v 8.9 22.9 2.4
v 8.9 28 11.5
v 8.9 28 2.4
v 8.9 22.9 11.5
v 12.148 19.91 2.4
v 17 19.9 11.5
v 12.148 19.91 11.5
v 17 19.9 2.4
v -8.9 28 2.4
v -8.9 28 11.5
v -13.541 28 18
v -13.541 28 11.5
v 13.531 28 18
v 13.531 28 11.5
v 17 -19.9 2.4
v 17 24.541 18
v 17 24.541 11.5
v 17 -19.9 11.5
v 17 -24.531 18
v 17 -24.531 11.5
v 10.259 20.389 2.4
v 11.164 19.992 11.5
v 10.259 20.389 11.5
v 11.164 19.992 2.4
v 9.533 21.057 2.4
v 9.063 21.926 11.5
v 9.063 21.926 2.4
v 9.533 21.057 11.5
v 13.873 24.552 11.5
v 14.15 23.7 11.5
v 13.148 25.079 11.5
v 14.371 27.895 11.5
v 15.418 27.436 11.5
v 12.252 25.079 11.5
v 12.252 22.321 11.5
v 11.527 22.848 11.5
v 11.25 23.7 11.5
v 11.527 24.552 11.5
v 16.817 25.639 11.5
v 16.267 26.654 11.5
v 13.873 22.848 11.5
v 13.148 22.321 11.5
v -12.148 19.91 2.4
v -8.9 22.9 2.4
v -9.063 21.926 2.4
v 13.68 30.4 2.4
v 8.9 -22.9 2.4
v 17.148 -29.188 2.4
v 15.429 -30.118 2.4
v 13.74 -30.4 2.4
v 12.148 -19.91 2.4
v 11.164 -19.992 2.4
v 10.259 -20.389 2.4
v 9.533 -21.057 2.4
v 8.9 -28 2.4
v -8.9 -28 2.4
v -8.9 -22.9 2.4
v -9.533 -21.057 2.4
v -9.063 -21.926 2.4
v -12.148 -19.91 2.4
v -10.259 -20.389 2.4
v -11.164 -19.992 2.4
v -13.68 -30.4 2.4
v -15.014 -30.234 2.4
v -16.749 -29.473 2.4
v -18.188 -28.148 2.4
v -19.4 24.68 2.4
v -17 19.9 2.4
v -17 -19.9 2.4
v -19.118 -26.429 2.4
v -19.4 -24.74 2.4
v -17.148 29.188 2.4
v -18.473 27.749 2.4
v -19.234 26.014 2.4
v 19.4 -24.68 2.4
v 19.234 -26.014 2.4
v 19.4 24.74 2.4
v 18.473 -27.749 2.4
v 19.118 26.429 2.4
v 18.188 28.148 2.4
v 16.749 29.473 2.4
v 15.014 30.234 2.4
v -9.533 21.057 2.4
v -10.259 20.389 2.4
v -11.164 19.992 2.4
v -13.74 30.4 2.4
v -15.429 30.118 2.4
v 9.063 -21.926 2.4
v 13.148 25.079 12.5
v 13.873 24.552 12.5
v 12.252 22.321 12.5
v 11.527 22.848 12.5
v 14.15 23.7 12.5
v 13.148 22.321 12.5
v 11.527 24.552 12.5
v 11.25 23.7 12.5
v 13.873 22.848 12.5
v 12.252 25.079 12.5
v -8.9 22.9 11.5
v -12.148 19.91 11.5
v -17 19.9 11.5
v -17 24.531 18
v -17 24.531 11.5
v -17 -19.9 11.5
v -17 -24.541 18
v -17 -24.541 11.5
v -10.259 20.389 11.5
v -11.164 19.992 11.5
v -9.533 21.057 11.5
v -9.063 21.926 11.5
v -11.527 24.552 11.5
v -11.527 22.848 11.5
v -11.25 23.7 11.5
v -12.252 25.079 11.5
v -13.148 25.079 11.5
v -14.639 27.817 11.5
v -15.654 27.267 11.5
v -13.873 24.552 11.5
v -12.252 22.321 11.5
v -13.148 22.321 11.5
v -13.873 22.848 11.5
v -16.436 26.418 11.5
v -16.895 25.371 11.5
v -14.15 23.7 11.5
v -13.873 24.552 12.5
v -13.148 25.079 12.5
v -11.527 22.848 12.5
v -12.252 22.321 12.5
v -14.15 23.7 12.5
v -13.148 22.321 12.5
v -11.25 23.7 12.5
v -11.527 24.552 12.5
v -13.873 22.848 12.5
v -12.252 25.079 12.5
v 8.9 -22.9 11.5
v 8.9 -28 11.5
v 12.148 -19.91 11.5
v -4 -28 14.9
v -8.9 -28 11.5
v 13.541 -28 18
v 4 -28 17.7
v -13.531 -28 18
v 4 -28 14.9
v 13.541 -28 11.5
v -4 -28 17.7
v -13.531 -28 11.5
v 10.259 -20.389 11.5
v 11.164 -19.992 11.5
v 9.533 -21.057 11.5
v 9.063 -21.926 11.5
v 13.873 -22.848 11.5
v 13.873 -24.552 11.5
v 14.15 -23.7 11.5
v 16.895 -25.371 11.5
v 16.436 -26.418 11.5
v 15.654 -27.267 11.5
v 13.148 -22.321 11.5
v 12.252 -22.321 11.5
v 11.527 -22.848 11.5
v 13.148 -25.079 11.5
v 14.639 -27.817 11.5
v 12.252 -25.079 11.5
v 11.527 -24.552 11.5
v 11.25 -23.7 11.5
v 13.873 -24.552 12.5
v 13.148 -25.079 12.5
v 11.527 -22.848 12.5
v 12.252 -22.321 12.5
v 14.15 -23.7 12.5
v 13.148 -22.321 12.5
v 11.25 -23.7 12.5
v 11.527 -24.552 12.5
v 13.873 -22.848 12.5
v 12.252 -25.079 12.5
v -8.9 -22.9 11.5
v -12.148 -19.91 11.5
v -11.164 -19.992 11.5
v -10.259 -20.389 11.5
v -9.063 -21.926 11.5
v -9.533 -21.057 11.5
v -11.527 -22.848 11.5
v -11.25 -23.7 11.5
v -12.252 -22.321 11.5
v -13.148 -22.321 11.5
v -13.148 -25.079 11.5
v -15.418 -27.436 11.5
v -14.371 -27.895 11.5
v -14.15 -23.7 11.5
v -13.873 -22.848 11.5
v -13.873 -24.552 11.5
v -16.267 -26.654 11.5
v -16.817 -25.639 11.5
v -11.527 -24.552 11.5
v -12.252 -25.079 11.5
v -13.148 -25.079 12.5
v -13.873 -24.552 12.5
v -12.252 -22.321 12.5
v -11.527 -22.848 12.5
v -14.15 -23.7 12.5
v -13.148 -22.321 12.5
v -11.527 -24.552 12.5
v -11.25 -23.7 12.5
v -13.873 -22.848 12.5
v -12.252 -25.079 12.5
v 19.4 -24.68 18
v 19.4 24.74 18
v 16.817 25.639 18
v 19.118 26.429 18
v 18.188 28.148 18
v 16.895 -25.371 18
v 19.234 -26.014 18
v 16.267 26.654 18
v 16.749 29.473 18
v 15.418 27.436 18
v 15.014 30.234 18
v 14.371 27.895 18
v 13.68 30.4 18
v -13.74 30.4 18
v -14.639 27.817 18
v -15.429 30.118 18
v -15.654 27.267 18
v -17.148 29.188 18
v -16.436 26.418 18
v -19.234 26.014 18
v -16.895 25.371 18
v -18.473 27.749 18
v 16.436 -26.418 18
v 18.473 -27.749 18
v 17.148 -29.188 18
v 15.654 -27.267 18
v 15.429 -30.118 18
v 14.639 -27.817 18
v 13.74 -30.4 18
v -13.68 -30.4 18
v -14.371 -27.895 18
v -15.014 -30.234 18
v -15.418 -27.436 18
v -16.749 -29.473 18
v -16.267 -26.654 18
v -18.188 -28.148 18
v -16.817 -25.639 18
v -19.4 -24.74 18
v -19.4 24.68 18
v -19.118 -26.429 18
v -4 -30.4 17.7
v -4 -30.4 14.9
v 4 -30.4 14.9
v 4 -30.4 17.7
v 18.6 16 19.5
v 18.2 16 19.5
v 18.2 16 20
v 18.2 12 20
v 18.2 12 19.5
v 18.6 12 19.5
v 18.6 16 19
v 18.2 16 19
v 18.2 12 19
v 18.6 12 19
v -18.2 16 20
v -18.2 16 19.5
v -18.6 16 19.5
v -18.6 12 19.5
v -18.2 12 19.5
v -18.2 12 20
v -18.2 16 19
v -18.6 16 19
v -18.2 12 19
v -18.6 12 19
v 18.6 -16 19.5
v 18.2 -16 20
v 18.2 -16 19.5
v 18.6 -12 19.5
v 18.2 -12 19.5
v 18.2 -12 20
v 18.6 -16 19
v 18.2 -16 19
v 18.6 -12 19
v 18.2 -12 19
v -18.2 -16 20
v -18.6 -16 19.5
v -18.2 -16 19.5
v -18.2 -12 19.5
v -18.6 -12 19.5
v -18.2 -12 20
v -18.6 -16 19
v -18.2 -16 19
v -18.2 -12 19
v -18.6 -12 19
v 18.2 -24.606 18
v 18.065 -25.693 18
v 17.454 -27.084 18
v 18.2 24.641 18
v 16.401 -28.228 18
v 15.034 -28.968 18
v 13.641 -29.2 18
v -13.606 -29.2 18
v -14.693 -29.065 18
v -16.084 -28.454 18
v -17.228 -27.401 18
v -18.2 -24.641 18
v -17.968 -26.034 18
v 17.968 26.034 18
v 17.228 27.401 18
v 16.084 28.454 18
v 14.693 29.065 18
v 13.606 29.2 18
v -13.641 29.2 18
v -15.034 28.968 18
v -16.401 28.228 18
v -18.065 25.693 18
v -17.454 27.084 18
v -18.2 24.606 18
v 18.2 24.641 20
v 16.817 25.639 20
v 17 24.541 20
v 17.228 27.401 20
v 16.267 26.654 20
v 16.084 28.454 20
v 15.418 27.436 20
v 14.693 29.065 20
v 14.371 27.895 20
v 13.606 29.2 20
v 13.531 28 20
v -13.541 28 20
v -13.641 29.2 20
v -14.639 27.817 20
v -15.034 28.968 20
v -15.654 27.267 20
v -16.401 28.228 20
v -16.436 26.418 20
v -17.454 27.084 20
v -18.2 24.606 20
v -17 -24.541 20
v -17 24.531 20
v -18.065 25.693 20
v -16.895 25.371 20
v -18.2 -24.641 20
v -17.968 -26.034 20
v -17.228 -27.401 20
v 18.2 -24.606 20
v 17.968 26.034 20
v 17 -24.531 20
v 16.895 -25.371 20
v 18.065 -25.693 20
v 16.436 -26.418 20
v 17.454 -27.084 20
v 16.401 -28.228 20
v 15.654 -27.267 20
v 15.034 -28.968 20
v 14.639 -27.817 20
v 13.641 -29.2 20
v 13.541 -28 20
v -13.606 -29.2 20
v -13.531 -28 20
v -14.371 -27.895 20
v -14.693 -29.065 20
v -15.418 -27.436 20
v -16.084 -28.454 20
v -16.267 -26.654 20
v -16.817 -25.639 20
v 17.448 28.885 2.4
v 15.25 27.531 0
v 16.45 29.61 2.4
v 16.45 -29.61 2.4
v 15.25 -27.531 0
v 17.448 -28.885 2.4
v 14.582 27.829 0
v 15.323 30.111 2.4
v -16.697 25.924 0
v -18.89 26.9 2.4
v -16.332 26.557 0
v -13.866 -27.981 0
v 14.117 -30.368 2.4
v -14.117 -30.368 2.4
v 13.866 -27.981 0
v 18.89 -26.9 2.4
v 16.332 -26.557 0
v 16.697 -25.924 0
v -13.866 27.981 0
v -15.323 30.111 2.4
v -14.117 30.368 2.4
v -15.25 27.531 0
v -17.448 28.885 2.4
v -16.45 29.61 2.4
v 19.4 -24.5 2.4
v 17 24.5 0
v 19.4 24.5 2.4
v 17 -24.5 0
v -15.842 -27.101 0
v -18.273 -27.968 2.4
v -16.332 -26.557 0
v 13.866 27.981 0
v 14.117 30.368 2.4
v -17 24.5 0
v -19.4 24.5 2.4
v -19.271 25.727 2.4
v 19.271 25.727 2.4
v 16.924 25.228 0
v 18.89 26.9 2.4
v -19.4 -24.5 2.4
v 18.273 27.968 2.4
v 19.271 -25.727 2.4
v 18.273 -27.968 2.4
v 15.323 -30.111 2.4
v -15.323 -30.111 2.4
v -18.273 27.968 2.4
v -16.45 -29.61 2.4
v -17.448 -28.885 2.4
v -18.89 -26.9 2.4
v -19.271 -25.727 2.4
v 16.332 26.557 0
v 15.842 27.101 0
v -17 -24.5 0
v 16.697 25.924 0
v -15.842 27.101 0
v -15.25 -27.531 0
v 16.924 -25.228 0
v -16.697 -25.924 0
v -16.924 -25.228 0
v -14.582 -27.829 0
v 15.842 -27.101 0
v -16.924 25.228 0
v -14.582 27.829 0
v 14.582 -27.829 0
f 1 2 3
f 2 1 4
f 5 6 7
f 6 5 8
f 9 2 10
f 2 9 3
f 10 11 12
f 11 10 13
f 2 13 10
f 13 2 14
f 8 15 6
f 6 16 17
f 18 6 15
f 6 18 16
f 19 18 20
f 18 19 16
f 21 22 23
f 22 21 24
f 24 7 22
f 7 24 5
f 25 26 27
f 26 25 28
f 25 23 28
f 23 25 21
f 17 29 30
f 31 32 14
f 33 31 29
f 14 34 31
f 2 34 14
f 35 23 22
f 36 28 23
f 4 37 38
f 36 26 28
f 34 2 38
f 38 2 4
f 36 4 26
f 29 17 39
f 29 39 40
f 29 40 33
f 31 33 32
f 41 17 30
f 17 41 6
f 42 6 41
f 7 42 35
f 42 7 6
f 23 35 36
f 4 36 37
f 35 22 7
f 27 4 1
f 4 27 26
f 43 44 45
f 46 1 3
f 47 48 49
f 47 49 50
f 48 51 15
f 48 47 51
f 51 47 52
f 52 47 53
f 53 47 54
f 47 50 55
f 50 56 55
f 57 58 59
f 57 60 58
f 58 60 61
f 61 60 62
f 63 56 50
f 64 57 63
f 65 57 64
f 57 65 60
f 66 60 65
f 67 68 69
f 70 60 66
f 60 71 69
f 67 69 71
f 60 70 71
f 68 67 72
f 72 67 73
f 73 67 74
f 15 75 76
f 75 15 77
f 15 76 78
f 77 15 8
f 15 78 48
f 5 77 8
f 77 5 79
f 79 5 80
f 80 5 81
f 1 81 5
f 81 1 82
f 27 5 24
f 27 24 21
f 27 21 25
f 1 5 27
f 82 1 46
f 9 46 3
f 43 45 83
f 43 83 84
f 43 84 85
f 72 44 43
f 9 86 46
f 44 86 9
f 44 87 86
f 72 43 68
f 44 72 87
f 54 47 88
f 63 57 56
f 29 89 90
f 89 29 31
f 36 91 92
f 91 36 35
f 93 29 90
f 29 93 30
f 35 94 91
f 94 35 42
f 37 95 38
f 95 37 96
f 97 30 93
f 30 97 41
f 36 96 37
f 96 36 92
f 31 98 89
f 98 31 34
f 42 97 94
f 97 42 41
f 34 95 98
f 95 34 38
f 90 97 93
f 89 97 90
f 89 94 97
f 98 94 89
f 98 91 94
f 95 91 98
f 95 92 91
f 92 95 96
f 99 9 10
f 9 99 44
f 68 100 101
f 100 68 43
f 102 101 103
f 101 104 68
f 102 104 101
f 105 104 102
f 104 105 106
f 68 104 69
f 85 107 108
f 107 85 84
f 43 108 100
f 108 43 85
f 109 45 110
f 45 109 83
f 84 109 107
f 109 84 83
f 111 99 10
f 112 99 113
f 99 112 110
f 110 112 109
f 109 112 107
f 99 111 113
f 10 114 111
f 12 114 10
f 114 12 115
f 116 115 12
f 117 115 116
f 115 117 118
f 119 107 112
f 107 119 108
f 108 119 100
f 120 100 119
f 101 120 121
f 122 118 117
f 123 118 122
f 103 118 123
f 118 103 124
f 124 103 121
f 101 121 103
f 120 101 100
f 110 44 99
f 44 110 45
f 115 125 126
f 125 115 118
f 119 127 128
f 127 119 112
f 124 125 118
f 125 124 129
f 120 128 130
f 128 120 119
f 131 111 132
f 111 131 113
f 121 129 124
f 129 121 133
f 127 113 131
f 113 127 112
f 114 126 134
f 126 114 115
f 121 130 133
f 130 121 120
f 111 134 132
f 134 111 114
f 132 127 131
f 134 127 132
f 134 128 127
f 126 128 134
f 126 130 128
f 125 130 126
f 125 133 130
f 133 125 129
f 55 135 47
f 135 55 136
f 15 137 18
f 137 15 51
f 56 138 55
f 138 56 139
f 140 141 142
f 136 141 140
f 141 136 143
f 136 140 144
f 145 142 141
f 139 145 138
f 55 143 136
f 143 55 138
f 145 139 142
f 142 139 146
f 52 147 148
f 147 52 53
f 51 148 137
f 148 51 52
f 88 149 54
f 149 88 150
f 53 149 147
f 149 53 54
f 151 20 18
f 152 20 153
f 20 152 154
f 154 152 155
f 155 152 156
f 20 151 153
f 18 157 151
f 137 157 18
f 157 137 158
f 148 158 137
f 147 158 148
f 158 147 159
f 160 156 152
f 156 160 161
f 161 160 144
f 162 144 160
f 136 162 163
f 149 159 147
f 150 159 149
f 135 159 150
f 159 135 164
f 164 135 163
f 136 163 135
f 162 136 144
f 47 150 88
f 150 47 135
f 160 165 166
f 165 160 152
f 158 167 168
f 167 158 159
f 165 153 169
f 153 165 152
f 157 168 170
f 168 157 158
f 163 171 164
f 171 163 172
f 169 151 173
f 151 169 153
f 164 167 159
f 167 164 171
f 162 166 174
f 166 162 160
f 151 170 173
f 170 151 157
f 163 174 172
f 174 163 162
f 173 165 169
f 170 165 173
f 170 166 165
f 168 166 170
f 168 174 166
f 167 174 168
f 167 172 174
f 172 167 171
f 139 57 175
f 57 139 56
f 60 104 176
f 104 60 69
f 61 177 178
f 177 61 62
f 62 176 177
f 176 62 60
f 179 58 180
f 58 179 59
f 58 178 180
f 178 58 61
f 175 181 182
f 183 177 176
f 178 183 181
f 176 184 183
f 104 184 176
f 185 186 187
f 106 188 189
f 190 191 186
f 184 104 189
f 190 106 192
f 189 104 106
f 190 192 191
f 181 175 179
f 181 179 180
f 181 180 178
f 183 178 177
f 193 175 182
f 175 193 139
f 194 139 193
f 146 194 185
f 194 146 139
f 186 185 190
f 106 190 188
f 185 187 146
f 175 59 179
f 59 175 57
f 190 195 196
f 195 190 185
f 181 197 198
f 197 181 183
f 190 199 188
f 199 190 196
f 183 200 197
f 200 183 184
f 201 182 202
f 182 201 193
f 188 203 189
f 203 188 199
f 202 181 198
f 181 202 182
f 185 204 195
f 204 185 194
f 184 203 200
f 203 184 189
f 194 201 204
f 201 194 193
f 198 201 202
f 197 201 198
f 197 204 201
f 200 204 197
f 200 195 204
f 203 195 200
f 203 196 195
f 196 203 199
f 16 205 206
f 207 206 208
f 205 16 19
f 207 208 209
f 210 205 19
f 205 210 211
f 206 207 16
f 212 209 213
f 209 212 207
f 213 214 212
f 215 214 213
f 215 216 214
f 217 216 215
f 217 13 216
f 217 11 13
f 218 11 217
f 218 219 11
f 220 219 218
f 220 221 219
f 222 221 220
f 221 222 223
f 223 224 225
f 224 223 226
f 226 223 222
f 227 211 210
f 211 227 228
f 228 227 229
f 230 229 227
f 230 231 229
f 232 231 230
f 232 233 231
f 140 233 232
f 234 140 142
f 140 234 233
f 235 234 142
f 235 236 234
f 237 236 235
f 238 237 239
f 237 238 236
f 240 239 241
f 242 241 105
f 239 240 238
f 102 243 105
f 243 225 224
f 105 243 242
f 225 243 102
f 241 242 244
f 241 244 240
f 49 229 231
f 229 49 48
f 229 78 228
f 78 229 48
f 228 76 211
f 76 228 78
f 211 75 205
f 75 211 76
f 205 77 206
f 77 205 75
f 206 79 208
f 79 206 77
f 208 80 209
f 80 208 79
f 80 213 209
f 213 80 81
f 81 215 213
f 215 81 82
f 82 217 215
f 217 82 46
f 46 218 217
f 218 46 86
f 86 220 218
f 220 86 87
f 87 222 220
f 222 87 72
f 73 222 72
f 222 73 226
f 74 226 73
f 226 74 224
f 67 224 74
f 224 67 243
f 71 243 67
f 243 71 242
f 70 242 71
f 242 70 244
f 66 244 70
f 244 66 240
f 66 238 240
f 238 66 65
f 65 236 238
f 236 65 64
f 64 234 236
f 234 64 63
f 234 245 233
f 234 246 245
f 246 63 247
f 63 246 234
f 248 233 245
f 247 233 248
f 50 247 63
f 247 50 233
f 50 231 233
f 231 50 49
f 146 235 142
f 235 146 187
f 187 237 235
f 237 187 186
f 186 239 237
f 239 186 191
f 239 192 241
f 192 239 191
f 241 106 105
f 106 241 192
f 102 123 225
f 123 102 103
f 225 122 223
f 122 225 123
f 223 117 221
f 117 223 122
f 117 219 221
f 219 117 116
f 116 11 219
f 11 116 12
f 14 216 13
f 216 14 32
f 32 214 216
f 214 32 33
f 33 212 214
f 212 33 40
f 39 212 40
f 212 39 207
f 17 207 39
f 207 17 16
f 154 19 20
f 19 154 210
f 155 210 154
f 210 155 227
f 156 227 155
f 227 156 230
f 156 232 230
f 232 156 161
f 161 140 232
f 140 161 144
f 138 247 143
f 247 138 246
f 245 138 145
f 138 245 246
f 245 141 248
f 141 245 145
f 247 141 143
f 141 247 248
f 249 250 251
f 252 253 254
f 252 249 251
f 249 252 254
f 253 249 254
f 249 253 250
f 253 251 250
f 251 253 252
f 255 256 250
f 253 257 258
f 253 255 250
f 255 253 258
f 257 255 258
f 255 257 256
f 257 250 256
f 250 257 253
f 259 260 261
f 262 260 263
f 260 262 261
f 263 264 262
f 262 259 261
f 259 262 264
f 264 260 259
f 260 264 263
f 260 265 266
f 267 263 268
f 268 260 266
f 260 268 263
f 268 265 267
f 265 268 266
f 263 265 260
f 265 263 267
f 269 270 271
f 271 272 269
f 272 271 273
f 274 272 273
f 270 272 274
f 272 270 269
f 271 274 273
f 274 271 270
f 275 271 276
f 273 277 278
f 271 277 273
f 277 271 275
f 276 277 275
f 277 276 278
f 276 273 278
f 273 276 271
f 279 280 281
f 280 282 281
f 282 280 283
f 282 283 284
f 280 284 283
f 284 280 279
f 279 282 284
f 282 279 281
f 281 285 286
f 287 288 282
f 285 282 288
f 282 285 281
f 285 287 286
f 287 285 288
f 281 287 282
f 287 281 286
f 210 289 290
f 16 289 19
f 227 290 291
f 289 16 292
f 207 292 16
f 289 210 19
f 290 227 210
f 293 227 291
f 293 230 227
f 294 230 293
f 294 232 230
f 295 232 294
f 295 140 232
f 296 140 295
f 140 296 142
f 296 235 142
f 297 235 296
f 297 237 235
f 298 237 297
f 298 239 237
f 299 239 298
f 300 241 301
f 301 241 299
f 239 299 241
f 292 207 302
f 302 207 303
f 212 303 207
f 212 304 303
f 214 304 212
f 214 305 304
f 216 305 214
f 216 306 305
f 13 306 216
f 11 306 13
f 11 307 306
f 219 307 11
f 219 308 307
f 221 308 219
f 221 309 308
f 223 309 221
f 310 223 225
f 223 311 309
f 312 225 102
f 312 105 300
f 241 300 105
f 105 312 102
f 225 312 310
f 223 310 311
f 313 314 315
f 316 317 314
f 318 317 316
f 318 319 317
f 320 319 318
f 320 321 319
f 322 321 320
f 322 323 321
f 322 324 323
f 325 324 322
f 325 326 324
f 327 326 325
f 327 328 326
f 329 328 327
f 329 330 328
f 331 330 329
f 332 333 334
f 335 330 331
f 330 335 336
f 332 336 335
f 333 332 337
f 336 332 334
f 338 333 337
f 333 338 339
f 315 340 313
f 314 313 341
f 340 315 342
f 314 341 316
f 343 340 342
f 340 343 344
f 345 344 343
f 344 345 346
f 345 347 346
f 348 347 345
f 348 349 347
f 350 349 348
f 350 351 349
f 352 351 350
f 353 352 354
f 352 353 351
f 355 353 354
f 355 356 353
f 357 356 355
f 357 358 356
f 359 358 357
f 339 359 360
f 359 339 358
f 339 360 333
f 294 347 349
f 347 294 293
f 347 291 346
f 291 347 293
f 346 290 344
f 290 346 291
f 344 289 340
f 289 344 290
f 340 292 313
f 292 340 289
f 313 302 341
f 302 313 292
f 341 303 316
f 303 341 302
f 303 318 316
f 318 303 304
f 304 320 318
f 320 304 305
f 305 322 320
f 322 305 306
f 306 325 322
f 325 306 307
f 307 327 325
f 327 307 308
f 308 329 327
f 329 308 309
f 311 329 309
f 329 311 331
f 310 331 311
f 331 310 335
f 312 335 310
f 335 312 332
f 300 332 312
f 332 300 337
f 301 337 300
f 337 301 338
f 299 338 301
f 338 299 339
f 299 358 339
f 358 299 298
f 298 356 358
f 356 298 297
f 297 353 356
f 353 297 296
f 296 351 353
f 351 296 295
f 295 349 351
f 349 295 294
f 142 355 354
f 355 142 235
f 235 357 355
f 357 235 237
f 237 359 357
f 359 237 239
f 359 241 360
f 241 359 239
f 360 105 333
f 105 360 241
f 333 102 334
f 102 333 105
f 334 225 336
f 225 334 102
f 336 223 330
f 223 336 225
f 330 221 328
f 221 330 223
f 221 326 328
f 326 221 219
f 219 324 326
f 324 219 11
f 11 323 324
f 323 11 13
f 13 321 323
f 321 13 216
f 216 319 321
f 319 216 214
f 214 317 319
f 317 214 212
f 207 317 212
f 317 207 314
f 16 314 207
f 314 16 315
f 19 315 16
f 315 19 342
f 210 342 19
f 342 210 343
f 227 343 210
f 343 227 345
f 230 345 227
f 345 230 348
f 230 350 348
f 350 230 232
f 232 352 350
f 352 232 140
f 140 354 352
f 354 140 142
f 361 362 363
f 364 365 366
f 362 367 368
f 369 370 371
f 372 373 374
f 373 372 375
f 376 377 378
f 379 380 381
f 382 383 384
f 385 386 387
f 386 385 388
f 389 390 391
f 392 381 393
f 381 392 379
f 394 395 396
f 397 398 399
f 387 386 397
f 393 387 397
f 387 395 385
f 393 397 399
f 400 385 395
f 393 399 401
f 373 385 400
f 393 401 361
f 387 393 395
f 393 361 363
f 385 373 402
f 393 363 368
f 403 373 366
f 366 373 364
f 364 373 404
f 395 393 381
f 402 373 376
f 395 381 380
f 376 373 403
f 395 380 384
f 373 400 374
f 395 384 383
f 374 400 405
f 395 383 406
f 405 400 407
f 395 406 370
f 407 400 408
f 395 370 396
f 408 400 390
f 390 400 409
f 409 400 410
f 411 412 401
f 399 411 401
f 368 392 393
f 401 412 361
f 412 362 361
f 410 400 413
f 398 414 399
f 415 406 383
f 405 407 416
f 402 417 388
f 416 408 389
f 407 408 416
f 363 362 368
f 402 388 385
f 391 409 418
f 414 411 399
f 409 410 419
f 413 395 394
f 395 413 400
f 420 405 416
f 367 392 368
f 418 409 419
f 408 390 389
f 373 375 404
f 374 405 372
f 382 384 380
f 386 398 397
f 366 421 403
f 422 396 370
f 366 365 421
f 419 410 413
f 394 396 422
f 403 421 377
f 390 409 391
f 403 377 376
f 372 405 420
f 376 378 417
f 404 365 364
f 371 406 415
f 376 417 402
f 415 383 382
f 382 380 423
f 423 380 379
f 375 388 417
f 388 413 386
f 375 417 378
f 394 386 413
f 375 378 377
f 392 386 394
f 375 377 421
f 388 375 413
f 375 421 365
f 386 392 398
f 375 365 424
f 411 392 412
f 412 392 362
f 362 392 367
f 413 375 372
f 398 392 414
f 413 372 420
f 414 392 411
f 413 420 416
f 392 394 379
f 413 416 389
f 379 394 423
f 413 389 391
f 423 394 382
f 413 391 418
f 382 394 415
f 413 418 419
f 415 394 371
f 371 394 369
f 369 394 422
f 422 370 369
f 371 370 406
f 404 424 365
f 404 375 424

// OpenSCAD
// file: parameters.scad
WallClearance = 0.5;
WallThickness = 2.4;

pcbw = 33;
pcbl = 55;
pcbt = 1;

PCBHoleR = 1.6;
PCBHoleEdgeDst = 2.2;

BottomHeaderHeight=8.6;
TopHeaderHeight=7.5; // TODO actually measured to 7.70

TightFit = 0.15;
LooseFit = 0.25;

flangeHeight = 2;
flangeW = 1.2;
outerFlangeW = 0.8;

snapH = 0.5;
snapD = 0.4;

buttonW = 6; // TODO merge?
PCBButtonW = 6;
PCBButtonH = 5;

buttonFlange = 1; // W & H
buttonR = 1;

epsilon = 0.001;

$fs=1;

module pcb() {
	rrect4(pcbw, pcbl, 3);
}
// file: se/antoneliasson/shapes.scad
/*
 * A library of (at the moment) 2D shapes.
 *
 * Copyright (c) 2017 Anton Eliasson
 *
 * MIT License
 */

/*
 * Rounded rectangle (1 corner)
 *
 * Right angle in origin, rounded corner furthest from origin.
 */
module rrect1(x, y, r) {
	assert(x >= 2*r && y >= 2*r);

	hull () {
		polygon([[0, 0], [x, 0], [0, y]]);
		translate([x-r, y-r, 0]) circle(r=r);
	}
}

/*
 * Rounded square (1 corner)
 *
 * Like rrect1 but equilateral.
 */
module rsquare1(s, r) {
	rrect1(s, s, r);
}

/*
 * Rounded rectangle (all 4 corners)
 */
module rrect4(x, y, r) {
	offset(r=r) offset(delta=-r) square([x, y], true);
}

/*
 * Rounded square (all 4 corners)
 *
 * Like rrect4 but equilateral.
 */
module rsquare4(s, r) {
	rrect4(s, s, r);
}

/*
 * Triangle with right angle in origin.
 */
module triangle(x, y) {
	polygon([[0, 0], [x, 0], [0, y]]);
}

module trapezoid(a, b, h, skew) {
	polygon([[0, 0], [a, 0], [skew+b, h], [skew, h]]);
}
// file: se/antoneliasson/operations.scad
/*
 * A library of transformations and operations on objects.
 *
 * Copyright (c) 2017 Anton Eliasson
 *
 * MIT License
 */

/*
 * Alias for linear_extrude, without the need to name the height parameter.
 */
module linextr(h) {
	linear_extrude(height=h) children();
}

/*
 * Mirror children through the XZ plane, the YZ plane, and both, resulting in
 * four copies around the origin.
 */
module fourwaymirror() {
	children();
	mirror([1, 0, 0]) children();
	mirror([0, 1, 0]) children();
	mirror([1, 0, 0]) mirror([0, 1, 0]) children();
}

module mirrorXZ() {
    children();
    mirror([0, 1, 0]) children();
}

module mirrorYZ() {
	children();
	mirror([1, 0, 0]) children();
}

// TODO fourwaymirror = mirrorXZ mirrorYZ
// main file
use <se/antoneliasson/operations.scad>
use <se/antoneliasson/shapes.scad>

include <parameters.scad>

module standoff() {
	translate([pcbw/2+WallClearance, pcbl/2+WallClearance, 0]) {
		rotate(180)
			linear_extrude(height=BottomHeaderHeight+WallClearance)
				rsquare1(WallClearance+2*PCBHoleEdgeDst+2*PCBHoleR, 3);
	}
	translate([pcbw/2-PCBHoleEdgeDst-PCBHoleR, pcbl/2-PCBHoleEdgeDst-PCBHoleR, BottomHeaderHeight+WallClearance])
		linear_extrude(height=pcbt) circle(r=PCBHoleR-TightFit);
}

module snap() {
	translate([pcbw/2+WallClearance+flangeW, 16, -snapH])
		rotate([90, 0, 0]) linear_extrude(height=4) triangle(snapD, snapH);
}

module Bottom () {
	// floor
	hull() fourwaymirror() translate([pcbw/2-3, pcbl/2-3, 0])
		cylinder(h=WallThickness, r1=3+WallClearance+WallThickness-WallThickness, r2=3+WallClearance+WallThickness);

	fourwaymirror() translate([0, 0, WallThickness]) standoff();

	// walls
	translate([0, 0, WallThickness]) difference () {
		linear_extrude(height=WallClearance
				+BottomHeaderHeight+pcbt+TopHeaderHeight-flangeHeight)
			difference() {
				offset(delta=WallClearance+WallThickness) pcb();
				offset(delta=WallClearance) pcb();
			}

		// usb cutout
		translate([0, -(pcbl/2+WallThickness+WallClearance), WallThickness+BottomHeaderHeight+WallClearance+pcbt]) linear_extrude(height=2.8)
			translate([-4, 0, 0]) square([8, WallThickness]);
	}
	// flange
	translate([0, 0, WallThickness+WallClearance
			+BottomHeaderHeight+pcbt+TopHeaderHeight-flangeHeight]) {
		linear_extrude(height=flangeHeight)
			difference() {
				offset(delta=WallClearance+flangeW) pcb();
				offset(delta=WallClearance) pcb();
			}
		// snaps
		fourwaymirror() {
			translate([0, 0, flangeHeight]) snap();
			translate([0, 0, flangeHeight-snapH]) snap();
		}

	}
}

render() Bottom();
